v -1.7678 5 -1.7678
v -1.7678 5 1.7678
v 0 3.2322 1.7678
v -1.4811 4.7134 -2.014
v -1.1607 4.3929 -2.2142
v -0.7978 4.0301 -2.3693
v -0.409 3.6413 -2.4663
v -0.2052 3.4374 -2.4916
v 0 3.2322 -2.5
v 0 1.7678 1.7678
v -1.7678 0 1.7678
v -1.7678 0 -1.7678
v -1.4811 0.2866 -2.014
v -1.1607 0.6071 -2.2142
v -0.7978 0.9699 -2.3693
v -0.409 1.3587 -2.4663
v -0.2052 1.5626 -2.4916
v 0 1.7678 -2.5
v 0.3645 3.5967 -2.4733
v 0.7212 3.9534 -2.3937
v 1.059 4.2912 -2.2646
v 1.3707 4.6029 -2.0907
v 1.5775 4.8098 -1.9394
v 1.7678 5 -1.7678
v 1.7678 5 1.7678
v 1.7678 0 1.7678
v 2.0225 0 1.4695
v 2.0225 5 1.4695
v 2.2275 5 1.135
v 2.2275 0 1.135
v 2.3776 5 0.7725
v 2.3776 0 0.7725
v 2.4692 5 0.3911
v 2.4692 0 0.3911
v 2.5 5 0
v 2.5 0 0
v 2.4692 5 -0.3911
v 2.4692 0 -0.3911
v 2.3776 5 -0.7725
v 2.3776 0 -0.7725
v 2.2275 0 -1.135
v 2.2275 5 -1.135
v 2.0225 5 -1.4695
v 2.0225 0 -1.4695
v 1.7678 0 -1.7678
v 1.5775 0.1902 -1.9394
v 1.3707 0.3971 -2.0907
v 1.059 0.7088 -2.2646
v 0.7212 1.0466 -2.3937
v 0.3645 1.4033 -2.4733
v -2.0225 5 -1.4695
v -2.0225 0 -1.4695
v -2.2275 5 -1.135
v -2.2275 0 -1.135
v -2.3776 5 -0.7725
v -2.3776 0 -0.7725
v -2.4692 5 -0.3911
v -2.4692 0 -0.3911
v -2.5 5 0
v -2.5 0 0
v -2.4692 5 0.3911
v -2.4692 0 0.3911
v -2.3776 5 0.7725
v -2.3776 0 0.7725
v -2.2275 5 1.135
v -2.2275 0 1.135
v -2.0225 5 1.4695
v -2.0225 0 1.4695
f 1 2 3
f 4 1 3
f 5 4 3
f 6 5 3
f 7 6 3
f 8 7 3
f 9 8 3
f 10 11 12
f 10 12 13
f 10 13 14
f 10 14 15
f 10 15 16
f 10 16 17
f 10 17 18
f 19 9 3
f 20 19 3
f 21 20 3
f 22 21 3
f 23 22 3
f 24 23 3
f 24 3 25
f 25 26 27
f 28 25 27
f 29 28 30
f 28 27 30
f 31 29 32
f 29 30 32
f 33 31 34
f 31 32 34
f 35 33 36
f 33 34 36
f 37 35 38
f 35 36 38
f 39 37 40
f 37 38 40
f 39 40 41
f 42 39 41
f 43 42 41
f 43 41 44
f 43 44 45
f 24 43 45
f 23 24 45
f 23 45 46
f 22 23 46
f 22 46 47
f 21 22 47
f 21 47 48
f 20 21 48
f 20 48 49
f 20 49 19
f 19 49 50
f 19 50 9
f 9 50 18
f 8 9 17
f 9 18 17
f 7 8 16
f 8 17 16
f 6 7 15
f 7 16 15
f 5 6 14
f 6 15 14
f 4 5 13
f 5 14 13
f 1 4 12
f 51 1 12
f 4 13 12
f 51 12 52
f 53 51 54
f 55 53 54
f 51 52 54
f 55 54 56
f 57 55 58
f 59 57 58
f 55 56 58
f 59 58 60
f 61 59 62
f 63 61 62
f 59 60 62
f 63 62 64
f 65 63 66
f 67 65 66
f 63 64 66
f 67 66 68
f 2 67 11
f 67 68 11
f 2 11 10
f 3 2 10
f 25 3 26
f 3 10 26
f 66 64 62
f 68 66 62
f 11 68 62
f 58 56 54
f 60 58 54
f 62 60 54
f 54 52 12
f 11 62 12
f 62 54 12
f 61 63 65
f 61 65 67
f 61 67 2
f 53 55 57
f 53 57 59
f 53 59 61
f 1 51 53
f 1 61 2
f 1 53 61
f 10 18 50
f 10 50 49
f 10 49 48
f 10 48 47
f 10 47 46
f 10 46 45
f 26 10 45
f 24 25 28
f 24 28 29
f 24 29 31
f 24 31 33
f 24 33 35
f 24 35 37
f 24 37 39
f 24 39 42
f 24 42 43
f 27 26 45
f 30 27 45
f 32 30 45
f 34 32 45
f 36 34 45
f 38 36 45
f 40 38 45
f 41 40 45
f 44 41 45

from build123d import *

# Parameters (mm, degrees)
BOSS_EXTRUDE1_DEPTH     = 5
CUT_EXTRUDE1_REACH      = 9.033
CUT_EXTRUDE1_END_RADIUS = 2.5


with BuildPart() as part:
    # Sketch1 → Boss-Extrude1 (new body)
    with BuildSketch(Plane(origin=(0, 0, 0), x_dir=(1, 0, 0), z_dir=(0, 1, 0))):
        with BuildLine():
            Line((-1.767766953, -1.767766953), (1.767766953, -1.767766953))
            ThreePointArc((1.767766953, -1.767766953), (0, 2.5), (-1.767766953, -1.767766953))
        make_face()
    extrude(amount=BOSS_EXTRUDE1_DEPTH)

    # Cut-Extrude1: up to this cylinder (the profile starts inside it)
    cut_extrude1_end = Plane(origin=(0, 2.5, 0), z_dir=(0, -1, 0)) * Cylinder(CUT_EXTRUDE1_END_RADIUS, 27.887488, mode=Mode.PRIVATE)
    # Sketch2 → Cut-Extrude1 (cut, up to the surface)
    with BuildSketch(Plane.XY.offset(1.767766953), mode=Mode.PRIVATE) as cut_extrude1_sk1:
        Polygon((-1.767766953, 0), (0, 1.767766953), (1.767766953, 0), align=None)
    cut_extrude1_tool1 = extrude(cut_extrude1_sk1.sketch, amount=-CUT_EXTRUDE1_REACH, mode=Mode.PRIVATE) & cut_extrude1_end
    add(cut_extrude1_tool1.solids().sort_by_distance((0, 0.589256, 1.767767))[0], mode=Mode.SUBTRACT)
    # Sketch2 → Cut-Extrude1 (cut, up to the surface)
    with BuildSketch(Plane.XY.offset(1.767766953), mode=Mode.PRIVATE) as cut_extrude1_sk2:
        Polygon((-1.767766953, 5), (0, 3.232233047), (1.767766953, 5), align=None)
    cut_extrude1_tool2 = extrude(cut_extrude1_sk2.sketch, amount=-CUT_EXTRUDE1_REACH, mode=Mode.PRIVATE) & cut_extrude1_end
    add(cut_extrude1_tool2.solids().sort_by_distance((0, 4.410744, 1.767767))[0], mode=Mode.SUBTRACT)


solid = part.part
